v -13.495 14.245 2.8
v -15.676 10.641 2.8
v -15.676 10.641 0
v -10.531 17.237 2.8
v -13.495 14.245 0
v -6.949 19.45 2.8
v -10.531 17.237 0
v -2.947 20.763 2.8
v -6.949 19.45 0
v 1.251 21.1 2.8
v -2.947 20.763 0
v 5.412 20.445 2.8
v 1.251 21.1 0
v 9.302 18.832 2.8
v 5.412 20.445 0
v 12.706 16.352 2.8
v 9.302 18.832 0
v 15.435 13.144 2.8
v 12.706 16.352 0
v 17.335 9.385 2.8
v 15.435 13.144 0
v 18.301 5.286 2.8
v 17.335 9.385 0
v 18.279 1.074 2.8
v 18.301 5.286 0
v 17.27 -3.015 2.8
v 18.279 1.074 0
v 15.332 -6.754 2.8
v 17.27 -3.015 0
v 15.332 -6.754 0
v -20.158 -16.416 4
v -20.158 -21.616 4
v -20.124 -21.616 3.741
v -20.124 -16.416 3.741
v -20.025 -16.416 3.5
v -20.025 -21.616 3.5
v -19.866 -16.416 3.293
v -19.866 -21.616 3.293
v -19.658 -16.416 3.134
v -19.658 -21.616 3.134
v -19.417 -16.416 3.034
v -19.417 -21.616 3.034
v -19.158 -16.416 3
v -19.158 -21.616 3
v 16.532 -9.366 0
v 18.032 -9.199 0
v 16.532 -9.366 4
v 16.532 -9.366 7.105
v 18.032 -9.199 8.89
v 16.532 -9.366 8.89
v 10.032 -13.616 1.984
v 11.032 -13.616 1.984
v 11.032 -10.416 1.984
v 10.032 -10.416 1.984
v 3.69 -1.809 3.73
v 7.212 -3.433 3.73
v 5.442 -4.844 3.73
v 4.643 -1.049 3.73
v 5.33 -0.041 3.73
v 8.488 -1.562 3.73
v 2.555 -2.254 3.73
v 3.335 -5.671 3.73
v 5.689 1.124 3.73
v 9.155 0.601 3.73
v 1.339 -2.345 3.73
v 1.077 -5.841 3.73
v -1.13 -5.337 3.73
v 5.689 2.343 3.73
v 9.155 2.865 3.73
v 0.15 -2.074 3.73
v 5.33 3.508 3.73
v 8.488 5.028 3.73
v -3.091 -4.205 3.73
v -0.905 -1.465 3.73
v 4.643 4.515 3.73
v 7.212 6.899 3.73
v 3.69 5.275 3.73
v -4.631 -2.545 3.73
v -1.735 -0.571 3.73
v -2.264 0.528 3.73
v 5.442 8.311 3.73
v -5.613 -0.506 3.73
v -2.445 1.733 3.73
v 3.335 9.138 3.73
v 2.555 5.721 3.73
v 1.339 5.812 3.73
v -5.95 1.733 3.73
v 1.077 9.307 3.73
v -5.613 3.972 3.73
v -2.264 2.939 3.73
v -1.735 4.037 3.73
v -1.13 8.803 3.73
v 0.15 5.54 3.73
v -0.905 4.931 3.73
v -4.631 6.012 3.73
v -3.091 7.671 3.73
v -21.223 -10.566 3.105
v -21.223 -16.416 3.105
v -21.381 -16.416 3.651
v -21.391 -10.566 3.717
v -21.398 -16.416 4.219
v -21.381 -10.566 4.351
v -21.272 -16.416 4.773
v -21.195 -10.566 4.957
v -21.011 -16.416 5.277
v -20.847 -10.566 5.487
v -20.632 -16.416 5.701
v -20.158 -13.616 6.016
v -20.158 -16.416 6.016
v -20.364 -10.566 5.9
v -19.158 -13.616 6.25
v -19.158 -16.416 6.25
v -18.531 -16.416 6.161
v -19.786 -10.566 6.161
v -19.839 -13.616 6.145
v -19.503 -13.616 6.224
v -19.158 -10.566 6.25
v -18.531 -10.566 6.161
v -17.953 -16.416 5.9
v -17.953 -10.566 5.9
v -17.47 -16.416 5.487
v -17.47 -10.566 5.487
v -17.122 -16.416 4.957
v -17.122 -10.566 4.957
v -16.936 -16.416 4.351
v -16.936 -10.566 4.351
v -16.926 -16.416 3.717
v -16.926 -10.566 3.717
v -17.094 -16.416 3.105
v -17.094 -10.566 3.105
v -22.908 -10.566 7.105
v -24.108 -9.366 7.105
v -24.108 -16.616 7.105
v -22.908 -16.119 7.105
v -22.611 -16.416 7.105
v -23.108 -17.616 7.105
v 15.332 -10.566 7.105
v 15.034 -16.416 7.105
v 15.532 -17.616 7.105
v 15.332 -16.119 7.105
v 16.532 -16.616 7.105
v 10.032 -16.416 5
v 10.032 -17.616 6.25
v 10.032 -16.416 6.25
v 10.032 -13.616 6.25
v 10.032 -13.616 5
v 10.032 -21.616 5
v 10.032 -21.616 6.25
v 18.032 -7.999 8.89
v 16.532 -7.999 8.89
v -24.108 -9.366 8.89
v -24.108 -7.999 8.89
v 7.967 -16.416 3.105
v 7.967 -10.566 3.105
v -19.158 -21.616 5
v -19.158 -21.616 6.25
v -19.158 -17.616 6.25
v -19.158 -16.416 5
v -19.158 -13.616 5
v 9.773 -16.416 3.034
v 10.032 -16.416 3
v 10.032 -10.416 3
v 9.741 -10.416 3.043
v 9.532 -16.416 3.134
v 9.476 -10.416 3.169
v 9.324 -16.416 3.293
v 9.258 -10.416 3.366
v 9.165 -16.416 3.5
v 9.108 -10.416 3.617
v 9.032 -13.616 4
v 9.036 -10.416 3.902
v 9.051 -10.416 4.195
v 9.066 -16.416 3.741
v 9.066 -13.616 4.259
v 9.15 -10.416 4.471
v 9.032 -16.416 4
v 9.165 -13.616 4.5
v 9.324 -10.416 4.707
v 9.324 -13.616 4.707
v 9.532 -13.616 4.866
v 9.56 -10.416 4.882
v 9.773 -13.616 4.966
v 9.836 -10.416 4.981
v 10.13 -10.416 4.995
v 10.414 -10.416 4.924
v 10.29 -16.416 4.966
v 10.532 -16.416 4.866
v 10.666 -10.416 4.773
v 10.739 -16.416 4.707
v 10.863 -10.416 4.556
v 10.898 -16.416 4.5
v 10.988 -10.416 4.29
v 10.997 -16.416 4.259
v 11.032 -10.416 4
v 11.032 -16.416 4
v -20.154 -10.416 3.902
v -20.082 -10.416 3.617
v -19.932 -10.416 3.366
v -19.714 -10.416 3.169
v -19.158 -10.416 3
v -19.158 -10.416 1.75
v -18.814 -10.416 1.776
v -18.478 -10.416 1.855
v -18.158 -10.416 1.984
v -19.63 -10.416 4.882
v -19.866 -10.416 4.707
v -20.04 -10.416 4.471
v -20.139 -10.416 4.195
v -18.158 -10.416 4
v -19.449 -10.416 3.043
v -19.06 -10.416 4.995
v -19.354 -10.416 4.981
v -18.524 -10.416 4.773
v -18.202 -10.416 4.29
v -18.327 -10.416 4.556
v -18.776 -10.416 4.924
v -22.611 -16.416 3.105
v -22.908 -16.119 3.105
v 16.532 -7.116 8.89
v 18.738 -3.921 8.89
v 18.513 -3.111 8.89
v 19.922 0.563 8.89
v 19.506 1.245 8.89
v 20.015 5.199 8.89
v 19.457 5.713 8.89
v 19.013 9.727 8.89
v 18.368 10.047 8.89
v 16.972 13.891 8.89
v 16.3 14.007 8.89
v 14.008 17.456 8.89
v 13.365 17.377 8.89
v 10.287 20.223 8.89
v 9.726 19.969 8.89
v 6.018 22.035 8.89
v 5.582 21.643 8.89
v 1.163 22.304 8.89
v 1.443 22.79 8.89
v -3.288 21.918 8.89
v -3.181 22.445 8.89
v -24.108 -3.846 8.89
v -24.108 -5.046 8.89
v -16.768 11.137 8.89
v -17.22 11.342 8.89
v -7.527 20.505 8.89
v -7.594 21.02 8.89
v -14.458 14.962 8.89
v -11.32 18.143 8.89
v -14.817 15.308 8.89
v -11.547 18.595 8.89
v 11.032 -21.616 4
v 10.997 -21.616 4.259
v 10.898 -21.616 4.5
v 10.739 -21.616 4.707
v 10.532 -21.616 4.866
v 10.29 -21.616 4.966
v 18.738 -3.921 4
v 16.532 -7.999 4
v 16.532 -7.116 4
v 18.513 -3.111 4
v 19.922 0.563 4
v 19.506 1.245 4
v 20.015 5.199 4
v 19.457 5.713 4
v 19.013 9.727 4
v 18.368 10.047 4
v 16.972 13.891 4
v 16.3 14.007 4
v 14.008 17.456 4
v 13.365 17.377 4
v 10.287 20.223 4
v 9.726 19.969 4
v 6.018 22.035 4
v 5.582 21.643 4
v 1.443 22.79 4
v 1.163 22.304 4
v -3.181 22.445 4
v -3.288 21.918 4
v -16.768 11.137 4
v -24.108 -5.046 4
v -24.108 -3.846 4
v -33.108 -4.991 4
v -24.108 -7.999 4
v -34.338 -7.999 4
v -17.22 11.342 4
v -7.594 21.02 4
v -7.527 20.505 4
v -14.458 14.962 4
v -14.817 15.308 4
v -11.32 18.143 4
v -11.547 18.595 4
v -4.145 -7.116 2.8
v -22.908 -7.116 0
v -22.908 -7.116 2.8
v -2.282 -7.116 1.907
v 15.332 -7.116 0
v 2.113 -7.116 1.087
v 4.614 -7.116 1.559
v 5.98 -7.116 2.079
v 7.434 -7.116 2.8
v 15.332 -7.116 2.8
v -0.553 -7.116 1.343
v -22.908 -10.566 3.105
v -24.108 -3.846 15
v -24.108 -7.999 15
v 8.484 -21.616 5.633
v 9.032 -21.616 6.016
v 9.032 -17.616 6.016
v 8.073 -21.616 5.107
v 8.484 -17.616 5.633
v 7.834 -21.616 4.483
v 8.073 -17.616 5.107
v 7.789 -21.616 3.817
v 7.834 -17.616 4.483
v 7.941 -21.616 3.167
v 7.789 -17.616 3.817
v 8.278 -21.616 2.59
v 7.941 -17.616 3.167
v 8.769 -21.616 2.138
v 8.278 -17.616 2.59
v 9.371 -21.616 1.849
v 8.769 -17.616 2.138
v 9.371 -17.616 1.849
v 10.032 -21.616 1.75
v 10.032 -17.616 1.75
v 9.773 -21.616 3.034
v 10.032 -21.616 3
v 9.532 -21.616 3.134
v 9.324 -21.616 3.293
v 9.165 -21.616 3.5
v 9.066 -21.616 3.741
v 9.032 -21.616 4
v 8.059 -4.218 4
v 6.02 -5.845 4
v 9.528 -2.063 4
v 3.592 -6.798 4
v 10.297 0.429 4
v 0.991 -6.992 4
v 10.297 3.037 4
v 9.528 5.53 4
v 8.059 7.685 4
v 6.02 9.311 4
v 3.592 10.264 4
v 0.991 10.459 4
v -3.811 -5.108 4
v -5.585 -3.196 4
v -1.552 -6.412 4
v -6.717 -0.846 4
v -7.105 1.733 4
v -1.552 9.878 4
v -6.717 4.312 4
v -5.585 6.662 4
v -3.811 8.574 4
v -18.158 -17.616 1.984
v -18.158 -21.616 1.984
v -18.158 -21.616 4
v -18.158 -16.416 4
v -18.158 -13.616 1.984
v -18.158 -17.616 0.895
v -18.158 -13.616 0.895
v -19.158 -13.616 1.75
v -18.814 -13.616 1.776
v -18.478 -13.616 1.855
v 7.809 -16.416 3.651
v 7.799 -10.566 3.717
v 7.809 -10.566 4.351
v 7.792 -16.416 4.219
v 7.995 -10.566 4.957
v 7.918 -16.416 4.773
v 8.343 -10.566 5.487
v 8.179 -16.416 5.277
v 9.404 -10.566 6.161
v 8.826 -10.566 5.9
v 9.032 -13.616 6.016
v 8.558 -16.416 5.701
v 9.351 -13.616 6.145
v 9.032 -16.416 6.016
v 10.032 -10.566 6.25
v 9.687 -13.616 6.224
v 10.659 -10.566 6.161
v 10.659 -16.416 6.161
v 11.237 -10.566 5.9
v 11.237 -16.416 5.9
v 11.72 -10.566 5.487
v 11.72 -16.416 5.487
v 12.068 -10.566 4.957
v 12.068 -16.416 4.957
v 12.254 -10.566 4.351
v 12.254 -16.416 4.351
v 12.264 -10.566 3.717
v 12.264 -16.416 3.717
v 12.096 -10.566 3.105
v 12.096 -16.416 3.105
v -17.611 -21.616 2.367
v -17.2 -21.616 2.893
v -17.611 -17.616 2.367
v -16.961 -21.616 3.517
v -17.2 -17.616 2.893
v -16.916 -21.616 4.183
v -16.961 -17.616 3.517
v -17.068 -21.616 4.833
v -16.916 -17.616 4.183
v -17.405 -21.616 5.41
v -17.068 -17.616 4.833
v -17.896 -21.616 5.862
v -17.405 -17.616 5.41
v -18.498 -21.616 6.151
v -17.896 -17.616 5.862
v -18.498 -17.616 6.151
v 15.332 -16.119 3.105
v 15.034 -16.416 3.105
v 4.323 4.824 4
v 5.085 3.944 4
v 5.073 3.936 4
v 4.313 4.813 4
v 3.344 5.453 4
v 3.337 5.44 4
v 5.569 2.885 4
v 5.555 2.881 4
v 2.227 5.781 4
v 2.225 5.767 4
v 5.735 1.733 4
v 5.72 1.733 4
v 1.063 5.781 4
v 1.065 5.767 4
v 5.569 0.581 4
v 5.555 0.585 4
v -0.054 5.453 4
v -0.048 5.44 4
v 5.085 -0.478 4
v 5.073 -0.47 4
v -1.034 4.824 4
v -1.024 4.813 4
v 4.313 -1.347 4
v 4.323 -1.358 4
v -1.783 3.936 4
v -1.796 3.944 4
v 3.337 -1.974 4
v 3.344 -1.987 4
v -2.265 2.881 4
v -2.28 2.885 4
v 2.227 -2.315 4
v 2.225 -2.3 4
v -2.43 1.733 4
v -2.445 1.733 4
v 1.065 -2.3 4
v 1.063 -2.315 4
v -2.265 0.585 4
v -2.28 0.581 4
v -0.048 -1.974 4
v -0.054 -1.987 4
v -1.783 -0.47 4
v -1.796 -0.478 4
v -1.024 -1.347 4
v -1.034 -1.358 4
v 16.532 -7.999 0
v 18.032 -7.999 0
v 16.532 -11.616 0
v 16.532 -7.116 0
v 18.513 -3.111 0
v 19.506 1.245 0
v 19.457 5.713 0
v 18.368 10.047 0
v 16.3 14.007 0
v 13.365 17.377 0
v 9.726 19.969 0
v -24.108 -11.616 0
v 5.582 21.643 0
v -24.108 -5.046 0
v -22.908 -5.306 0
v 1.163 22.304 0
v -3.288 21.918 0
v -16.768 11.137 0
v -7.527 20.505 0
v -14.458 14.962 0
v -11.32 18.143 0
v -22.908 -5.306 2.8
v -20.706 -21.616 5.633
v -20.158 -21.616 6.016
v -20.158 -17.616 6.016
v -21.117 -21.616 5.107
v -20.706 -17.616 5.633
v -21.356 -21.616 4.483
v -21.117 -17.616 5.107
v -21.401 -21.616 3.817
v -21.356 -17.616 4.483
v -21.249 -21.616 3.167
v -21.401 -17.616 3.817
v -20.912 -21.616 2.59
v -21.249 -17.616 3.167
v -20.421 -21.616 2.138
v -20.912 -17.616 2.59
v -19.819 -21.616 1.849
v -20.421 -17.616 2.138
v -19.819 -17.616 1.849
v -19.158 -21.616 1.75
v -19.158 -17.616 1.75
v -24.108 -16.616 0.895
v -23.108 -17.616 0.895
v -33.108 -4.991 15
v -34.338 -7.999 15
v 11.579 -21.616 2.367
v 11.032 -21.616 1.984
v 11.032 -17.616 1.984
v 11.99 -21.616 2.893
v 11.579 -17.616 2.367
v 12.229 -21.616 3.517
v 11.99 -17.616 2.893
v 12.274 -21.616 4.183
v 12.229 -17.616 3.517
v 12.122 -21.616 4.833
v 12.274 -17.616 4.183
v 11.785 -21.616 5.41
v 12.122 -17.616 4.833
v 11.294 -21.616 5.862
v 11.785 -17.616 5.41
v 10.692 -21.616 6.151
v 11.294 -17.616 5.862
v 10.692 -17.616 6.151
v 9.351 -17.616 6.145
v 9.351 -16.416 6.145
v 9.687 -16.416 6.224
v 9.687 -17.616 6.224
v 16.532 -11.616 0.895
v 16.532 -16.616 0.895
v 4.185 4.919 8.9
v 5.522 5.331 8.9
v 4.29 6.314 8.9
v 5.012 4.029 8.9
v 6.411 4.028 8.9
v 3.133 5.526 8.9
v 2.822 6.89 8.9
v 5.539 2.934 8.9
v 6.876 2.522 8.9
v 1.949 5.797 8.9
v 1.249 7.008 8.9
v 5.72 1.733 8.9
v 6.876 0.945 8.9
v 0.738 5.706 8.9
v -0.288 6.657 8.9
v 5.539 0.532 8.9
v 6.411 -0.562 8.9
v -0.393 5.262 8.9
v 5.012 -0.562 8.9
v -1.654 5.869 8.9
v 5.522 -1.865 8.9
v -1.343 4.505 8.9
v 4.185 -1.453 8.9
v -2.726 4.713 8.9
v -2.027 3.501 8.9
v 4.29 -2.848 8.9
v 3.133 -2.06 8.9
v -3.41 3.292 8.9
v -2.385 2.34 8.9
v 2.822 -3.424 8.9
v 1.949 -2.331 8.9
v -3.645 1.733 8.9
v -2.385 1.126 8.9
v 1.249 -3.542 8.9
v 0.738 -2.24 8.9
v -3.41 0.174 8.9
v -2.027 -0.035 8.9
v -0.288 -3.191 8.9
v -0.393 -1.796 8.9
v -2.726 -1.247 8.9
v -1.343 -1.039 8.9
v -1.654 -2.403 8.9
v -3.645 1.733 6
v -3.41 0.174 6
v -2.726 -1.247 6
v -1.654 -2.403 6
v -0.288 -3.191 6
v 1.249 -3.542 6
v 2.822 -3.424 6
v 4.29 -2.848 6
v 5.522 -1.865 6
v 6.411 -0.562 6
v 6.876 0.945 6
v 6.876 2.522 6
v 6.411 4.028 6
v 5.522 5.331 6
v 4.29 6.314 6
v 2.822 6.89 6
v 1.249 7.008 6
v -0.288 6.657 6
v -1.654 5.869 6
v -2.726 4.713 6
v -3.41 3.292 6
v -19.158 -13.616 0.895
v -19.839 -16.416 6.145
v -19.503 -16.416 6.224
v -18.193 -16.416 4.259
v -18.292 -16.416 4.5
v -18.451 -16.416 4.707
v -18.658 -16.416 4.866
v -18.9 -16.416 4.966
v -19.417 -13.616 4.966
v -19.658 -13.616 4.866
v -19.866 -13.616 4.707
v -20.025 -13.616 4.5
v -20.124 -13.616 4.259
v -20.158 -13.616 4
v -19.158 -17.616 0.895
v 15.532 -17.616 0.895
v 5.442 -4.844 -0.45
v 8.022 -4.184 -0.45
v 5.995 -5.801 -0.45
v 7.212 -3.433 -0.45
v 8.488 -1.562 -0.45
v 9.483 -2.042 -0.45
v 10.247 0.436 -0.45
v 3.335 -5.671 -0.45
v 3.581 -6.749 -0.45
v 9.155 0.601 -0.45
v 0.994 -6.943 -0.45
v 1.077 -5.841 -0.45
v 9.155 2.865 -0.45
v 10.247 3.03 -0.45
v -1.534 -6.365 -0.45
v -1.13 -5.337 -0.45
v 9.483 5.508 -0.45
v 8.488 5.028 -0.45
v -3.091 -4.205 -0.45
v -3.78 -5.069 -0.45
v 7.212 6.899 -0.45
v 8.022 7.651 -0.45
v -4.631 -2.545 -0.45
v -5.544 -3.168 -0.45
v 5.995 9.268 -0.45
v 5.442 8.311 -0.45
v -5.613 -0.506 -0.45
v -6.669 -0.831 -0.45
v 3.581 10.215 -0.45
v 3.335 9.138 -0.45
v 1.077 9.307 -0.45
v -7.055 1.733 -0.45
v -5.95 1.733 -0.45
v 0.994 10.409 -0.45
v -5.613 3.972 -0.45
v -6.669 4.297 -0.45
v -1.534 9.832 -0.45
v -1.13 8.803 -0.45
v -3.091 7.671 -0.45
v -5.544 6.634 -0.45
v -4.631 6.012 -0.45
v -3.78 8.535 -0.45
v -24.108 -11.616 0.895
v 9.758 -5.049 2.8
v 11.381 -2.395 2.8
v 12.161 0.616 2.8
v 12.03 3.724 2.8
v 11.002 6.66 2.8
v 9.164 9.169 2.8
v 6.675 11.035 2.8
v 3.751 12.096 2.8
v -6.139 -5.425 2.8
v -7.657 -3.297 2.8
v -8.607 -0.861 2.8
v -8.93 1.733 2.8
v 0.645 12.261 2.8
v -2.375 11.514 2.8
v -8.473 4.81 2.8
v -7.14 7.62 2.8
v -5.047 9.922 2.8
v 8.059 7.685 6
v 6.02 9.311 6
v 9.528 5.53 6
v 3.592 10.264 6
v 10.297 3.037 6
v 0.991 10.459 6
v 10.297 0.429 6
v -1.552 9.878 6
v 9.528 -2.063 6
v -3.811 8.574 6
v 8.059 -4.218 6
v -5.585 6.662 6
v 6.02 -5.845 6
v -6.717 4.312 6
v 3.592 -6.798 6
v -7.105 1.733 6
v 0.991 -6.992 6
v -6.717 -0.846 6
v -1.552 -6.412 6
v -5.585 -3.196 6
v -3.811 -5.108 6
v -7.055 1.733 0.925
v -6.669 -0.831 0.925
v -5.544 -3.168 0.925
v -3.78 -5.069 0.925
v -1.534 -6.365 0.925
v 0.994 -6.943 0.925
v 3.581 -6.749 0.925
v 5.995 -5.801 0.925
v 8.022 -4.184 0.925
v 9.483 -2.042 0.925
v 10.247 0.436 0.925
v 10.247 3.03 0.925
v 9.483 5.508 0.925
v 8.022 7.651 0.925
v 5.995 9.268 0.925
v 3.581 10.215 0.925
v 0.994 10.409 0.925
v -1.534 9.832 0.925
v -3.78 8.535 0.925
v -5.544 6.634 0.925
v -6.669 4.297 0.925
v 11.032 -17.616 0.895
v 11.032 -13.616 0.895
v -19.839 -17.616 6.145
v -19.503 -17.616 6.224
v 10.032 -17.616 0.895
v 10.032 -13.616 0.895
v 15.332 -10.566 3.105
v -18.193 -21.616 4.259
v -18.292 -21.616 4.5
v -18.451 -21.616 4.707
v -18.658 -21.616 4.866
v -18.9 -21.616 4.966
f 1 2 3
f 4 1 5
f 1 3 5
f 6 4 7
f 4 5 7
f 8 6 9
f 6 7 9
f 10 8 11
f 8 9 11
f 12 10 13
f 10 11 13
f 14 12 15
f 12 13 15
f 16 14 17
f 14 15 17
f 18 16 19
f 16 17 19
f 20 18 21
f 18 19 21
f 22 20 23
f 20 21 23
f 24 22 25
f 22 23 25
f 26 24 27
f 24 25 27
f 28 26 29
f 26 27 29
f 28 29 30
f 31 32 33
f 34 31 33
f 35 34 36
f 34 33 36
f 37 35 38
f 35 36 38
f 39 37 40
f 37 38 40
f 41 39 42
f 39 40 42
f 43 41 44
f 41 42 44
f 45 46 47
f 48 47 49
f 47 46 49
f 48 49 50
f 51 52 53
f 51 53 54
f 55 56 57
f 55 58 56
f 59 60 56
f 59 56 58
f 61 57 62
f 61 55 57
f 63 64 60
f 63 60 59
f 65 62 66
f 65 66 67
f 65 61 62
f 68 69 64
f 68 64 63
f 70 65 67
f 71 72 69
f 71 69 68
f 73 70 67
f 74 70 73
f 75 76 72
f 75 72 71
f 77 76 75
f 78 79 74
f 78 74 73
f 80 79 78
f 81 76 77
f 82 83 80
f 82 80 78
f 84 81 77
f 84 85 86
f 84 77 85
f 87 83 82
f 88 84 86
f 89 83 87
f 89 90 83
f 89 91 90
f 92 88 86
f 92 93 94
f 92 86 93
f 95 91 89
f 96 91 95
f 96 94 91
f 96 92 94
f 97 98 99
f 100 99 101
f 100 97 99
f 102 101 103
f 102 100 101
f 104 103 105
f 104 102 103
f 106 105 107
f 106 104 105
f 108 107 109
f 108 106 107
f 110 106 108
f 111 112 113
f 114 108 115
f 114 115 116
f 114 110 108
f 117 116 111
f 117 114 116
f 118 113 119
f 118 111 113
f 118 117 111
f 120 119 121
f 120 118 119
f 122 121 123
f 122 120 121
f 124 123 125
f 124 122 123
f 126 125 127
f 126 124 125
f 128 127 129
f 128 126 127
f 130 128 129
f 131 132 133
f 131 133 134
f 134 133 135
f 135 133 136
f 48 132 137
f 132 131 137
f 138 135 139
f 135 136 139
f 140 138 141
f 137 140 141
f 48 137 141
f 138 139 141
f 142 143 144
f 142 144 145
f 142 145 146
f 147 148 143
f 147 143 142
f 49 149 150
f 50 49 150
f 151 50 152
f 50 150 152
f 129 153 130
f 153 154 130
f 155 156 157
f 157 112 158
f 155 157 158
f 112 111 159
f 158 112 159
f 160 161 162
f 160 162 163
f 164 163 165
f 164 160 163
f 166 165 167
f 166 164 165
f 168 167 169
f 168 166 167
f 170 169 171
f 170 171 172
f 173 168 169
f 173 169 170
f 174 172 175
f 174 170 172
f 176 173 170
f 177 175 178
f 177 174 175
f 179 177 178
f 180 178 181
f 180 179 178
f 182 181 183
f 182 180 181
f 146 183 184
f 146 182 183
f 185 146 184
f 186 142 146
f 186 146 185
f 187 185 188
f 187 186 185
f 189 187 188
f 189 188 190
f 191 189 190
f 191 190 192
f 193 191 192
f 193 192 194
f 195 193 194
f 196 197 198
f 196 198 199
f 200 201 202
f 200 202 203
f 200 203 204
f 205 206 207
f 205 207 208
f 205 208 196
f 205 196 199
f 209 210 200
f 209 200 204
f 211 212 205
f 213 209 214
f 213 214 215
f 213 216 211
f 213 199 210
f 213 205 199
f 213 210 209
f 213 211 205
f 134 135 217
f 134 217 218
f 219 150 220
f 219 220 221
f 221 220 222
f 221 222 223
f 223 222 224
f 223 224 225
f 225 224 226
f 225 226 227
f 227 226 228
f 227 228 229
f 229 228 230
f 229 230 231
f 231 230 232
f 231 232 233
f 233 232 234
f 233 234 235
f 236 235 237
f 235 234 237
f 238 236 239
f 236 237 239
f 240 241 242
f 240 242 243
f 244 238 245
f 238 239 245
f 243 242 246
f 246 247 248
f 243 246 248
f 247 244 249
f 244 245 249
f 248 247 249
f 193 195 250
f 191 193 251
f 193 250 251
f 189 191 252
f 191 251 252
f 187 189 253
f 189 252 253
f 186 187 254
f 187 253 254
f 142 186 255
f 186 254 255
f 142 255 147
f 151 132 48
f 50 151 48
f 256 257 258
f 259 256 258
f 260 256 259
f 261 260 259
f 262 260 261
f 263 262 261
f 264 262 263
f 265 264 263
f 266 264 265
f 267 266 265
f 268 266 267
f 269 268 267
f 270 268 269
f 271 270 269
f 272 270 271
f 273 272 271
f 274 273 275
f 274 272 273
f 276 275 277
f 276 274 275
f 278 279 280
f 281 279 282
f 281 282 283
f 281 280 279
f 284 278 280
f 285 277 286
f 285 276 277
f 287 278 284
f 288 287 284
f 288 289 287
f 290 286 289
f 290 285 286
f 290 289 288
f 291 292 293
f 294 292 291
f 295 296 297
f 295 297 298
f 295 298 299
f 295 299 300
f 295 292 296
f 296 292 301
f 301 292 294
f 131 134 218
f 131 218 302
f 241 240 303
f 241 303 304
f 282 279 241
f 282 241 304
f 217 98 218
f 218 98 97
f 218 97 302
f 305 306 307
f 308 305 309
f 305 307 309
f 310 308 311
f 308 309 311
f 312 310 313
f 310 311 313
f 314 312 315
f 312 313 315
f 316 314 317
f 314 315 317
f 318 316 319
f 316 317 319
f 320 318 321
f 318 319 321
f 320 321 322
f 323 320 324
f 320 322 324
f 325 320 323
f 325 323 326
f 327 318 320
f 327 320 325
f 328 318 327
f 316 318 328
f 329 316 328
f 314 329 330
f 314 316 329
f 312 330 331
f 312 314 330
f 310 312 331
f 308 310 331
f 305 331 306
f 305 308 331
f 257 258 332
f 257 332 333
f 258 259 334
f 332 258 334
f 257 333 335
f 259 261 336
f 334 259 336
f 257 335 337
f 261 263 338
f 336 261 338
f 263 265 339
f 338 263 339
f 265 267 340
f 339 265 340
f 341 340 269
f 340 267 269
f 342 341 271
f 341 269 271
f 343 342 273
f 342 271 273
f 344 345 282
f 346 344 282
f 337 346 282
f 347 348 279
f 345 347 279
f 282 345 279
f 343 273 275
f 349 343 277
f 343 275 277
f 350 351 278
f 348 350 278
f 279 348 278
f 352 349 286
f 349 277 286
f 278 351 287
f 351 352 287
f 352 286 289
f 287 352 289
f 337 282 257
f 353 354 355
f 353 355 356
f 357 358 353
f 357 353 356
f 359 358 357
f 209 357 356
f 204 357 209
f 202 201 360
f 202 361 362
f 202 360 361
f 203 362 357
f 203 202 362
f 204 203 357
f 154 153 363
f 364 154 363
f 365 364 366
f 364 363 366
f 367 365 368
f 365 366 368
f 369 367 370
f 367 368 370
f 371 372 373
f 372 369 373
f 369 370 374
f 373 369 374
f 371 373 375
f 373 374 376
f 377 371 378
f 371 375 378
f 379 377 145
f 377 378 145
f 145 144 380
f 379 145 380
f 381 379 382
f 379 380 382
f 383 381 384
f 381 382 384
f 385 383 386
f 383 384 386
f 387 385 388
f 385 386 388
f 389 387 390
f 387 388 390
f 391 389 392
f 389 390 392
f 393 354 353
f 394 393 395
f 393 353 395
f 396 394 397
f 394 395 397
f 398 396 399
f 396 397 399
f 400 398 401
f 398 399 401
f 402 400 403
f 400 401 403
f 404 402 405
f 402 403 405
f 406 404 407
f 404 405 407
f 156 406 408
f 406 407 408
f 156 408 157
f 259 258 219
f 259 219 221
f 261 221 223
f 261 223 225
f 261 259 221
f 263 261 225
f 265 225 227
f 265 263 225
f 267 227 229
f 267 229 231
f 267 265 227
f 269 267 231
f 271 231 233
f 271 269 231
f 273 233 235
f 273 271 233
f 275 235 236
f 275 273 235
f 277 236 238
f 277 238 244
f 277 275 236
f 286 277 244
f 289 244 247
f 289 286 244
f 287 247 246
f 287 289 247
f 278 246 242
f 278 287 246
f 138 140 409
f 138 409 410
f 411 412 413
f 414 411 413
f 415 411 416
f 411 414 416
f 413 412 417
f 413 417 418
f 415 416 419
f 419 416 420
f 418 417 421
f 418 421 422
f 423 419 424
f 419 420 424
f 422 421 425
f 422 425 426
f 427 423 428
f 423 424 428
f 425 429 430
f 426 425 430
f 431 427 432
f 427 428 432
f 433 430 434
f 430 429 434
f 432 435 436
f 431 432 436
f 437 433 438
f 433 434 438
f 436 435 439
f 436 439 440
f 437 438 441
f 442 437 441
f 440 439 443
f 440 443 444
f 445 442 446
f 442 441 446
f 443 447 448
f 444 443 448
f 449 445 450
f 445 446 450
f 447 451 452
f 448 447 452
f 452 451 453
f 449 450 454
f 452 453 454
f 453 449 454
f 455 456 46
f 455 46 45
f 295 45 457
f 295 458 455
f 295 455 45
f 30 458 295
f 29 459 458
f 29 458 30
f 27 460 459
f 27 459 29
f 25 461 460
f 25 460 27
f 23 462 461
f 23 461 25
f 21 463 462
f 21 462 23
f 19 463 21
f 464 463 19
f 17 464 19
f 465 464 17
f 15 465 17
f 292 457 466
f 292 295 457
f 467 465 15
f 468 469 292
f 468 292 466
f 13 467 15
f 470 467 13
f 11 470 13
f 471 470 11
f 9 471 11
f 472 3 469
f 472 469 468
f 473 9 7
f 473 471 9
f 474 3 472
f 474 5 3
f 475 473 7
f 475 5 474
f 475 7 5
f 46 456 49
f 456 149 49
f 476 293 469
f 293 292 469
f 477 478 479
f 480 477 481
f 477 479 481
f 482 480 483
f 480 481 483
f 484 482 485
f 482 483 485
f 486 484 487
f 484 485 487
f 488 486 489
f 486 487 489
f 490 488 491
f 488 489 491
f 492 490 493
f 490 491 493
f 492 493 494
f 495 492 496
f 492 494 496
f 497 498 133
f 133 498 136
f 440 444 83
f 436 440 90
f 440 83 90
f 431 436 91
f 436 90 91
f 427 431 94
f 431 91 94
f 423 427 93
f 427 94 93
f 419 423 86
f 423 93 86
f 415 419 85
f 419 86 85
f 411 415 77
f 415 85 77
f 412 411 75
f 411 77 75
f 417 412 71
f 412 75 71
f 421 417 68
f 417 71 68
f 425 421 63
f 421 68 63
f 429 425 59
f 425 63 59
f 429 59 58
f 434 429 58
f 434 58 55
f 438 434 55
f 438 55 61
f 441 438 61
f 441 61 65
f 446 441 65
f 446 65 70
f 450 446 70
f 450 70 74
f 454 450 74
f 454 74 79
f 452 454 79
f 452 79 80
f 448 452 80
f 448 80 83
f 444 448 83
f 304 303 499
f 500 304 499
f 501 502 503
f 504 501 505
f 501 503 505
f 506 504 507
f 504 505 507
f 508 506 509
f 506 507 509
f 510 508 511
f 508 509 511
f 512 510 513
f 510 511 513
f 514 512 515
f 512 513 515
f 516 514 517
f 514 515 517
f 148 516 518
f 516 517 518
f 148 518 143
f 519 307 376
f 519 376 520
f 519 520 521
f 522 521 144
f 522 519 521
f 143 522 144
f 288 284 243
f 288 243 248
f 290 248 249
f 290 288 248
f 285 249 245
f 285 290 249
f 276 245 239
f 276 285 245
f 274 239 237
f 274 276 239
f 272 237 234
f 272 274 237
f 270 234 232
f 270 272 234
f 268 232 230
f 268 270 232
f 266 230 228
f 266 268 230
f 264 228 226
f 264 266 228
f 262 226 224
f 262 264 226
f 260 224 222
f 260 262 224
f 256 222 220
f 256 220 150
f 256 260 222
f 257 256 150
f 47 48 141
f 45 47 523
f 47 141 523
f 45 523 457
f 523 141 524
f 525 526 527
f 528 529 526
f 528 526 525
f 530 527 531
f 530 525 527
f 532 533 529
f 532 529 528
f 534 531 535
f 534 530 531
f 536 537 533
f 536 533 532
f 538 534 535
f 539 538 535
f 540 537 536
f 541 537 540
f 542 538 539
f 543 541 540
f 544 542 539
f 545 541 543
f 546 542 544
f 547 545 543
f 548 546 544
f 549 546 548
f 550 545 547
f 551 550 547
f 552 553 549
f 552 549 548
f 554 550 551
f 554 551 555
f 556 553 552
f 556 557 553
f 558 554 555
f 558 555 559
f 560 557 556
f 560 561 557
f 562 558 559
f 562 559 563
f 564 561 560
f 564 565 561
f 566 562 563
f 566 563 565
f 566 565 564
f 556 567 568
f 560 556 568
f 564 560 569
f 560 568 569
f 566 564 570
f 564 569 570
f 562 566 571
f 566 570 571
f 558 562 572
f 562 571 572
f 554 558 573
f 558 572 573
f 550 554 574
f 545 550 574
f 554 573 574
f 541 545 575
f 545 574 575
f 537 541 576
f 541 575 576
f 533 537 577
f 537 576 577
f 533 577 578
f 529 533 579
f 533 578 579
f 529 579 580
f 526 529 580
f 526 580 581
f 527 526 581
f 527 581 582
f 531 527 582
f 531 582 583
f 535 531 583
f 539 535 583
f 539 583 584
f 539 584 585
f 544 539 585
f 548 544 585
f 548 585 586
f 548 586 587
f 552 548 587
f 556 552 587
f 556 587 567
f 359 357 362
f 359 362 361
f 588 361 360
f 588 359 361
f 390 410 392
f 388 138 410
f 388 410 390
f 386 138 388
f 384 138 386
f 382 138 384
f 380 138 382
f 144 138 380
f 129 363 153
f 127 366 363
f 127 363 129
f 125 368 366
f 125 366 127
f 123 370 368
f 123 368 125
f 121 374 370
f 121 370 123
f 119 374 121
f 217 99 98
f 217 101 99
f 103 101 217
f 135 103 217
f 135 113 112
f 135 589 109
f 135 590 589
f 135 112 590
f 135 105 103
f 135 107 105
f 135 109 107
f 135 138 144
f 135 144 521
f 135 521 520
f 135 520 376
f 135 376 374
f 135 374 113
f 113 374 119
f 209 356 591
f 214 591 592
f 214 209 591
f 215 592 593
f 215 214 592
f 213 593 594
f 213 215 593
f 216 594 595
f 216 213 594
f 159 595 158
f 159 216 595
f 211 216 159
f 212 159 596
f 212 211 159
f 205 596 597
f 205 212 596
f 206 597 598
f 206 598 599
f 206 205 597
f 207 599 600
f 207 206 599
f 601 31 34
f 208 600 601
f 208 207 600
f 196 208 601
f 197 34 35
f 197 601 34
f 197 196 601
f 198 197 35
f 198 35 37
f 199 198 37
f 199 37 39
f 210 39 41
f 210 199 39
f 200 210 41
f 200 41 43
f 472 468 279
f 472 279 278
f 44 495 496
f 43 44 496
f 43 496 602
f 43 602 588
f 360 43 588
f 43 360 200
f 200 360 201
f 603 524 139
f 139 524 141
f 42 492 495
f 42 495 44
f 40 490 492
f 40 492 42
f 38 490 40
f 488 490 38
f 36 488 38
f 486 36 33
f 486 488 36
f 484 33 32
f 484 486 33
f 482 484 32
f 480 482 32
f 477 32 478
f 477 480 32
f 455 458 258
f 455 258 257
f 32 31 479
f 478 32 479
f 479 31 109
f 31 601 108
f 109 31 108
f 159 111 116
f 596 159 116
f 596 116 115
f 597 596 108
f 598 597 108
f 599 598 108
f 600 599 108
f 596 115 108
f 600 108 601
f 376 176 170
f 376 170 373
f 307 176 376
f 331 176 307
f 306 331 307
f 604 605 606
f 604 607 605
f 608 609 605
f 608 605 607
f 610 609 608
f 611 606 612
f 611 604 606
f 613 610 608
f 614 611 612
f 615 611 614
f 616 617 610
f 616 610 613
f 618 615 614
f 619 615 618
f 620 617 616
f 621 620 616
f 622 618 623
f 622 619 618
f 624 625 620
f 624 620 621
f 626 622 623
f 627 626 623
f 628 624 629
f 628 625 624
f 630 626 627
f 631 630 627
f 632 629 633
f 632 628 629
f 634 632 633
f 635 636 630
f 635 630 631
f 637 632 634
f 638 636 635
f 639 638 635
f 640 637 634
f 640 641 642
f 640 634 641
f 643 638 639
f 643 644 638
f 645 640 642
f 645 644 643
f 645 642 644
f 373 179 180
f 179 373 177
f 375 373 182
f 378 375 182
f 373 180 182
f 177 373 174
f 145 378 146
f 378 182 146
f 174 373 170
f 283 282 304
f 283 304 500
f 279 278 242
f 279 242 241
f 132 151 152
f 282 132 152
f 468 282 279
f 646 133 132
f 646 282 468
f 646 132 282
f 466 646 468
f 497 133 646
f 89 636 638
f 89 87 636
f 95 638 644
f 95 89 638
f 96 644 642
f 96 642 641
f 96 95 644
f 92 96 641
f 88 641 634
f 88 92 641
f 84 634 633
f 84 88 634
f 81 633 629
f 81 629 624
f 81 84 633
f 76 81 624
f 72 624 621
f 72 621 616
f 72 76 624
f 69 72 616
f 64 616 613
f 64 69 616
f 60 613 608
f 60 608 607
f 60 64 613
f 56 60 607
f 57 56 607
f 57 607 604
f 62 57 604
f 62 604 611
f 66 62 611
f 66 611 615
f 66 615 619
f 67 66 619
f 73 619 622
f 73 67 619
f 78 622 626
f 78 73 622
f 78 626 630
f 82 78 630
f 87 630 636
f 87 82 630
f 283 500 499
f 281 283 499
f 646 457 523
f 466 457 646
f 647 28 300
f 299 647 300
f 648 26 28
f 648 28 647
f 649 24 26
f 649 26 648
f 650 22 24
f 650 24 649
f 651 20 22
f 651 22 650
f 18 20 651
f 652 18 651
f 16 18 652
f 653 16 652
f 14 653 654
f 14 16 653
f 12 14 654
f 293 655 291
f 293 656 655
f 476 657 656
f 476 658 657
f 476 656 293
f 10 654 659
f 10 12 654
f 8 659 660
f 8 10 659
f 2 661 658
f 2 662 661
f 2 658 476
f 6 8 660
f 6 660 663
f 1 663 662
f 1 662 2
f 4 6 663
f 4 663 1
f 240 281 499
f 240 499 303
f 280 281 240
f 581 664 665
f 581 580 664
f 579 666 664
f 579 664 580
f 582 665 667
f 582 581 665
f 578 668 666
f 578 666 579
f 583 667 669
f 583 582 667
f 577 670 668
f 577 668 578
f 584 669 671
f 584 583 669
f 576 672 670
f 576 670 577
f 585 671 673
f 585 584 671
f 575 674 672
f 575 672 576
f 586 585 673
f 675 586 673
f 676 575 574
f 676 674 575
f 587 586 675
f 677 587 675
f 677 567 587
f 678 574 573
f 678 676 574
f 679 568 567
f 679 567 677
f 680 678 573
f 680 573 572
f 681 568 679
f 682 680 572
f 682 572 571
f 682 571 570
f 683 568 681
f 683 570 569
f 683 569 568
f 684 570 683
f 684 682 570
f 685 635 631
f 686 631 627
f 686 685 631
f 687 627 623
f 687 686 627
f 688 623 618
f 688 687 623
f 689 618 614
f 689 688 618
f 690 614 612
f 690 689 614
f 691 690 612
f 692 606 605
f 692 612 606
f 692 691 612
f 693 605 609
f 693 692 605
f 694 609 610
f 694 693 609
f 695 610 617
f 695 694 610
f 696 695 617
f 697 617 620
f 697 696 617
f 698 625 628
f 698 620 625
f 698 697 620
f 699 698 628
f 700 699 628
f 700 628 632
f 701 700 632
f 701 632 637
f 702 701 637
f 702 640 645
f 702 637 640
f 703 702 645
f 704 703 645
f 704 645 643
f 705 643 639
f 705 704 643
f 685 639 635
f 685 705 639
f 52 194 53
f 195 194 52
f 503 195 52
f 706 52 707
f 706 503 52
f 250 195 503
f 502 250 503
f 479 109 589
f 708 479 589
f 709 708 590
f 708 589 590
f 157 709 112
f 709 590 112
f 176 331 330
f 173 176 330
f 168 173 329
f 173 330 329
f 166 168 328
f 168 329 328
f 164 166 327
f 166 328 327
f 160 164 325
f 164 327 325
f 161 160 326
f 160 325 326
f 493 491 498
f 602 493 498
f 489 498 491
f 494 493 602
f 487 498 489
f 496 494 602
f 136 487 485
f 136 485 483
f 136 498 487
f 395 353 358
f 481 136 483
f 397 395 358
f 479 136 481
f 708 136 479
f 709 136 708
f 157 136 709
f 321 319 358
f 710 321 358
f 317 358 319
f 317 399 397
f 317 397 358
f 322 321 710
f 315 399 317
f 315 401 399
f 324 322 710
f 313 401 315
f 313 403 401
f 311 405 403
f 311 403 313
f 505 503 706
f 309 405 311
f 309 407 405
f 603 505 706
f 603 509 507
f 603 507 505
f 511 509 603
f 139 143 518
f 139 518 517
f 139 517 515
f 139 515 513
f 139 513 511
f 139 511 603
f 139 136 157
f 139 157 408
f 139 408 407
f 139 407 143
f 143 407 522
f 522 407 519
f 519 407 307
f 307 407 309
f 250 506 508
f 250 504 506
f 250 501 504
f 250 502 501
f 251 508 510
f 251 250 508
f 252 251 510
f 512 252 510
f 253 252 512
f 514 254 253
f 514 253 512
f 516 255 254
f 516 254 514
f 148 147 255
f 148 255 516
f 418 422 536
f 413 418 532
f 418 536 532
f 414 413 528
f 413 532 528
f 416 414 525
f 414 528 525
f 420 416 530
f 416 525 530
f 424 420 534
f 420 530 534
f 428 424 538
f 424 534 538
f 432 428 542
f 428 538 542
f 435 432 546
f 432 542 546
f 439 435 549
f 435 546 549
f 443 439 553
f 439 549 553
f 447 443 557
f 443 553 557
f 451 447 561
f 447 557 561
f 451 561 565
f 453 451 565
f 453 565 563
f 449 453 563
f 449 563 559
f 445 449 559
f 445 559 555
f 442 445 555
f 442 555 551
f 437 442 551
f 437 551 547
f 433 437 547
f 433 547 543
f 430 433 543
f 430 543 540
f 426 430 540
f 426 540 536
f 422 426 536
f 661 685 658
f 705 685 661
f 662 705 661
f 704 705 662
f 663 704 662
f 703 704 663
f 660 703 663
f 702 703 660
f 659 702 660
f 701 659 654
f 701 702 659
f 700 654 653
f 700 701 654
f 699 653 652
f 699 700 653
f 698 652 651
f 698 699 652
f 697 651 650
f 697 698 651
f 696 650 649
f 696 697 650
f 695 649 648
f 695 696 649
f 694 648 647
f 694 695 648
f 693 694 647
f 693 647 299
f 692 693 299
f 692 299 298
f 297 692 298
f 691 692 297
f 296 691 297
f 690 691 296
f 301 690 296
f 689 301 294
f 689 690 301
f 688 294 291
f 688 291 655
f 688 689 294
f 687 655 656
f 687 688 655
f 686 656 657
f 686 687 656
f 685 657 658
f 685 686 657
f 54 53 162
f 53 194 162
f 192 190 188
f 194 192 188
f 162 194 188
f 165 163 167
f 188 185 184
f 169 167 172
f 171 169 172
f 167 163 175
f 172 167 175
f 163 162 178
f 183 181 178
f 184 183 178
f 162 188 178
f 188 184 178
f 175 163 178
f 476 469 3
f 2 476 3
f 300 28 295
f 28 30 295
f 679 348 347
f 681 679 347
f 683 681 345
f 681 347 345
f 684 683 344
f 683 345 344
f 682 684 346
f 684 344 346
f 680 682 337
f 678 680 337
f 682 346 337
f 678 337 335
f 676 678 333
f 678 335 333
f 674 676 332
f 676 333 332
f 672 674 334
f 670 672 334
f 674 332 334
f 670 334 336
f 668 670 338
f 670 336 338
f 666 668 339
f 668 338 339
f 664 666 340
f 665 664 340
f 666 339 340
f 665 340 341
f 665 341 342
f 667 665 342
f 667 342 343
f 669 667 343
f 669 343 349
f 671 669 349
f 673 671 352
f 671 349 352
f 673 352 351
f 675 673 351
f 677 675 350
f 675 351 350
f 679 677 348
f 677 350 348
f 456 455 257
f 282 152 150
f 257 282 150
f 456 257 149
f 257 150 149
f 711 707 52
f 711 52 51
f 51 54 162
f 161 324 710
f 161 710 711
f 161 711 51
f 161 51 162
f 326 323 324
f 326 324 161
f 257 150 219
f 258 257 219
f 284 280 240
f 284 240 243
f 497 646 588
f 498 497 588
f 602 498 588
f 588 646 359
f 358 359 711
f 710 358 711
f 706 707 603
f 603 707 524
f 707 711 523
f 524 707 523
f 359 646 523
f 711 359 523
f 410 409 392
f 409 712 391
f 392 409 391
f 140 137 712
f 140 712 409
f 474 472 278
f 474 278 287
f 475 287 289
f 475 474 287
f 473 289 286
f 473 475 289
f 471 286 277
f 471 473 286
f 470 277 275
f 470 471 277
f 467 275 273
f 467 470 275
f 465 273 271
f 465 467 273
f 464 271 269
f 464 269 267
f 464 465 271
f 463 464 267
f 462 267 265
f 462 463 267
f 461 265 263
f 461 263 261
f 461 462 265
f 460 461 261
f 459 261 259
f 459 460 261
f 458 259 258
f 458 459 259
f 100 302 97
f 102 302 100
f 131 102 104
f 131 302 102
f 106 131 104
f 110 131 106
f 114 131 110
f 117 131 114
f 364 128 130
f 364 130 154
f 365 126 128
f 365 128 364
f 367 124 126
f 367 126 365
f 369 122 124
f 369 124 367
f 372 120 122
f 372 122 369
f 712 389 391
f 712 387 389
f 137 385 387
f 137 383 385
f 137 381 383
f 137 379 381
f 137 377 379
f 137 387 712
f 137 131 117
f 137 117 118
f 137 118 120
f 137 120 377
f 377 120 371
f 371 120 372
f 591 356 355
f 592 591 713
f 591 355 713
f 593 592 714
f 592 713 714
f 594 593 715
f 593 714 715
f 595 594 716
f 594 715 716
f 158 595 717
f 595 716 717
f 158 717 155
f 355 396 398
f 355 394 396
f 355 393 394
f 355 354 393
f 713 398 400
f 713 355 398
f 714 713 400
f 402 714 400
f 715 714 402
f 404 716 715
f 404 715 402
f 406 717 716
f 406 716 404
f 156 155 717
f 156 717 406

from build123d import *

# Parameters (mm, degrees)
BOSS_EXTRUDE1_DEPTH  = 4
SHELL1_T             = -1.2
SKETCH3_R            = 10.575
BOSS_EXTRUDE2_DEPTH  = 2.75
SKETCH4_R            = 8.7
SKETCH4_R_2          = 7.595
BOSS_EXTRUDE3_DEPTH  = 0.5
CHAMFER1_SIZE        = 2.75
CUT_EXTRUDE2_START   = -3.68
SKETCH5_R            = 7.595
CUT_EXTRUDE2_DEPTH   = 3.68
SKETCH6_R            = 4.09
CUT_EXTRUDE3_DEPTH   = 3.68
SKETCH7_W            = 40.64
SKETCH7_H            = 4.5
BOSS_EXTRUDE5_DEPTH  = 6
SKETCH18_W           = 40.64
SKETCH18_H           = 4.5
CUT_EXTRUDE10_DEPTH  = 2
BOSS_EXTRUDE16_DEPTH = 4.89
SKETCH20_W           = 40.64
SKETCH20_H           = 1.367101803
BOSS_EXTRUDE17_DEPTH = 4.89
BOSS_EXTRUDE18_DEPTH = 4.89
BOSS_EXTRUDE19_DEPTH = 4
BOSS_EXTRUDE24_DEPTH = 11
SKETCH31_W           = 40.64
SKETCH31_H           = 6.21
BOSS_EXTRUDE32_DEPTH = 6
CHAMFER2_SIZE        = 1
CHAMFER3_SIZE        = 1
SKETCH32_R           = 2.25
BOSS_EXTRUDE33_DEPTH = 4
SKETCH33_R           = 2.25
BOSS_EXTRUDE34_DEPTH = 4
SKETCH34_R           = 1
CUT_EXTRUDE14_DEPTH  = 8
CUT_EXTRUDE16_DEPTH  = 8
SKETCH37_R           = 1
CUT_EXTRUDE17_DEPTH  = 8
CUT_EXTRUDE19_DEPTH  = 8
SKETCH42_R           = 5.29
BOSS_EXTRUDE36_DEPTH = 4.9
SKETCH47_R           = 4.075
CUT_EXTRUDE21_DEPTH  = 21.9
SKETCH55_W           = 40.64
SKETCH55_H           = 3.105
BOSS_EXTRUDE47_DEPTH = 2.25
SKETCH59_W           = 1
SKETCH59_H           = 4
CUT_EXTRUDE29_DEPTH  = 1.08944
CUT_EXTRUDE35_DEPTH  = 4
BOSS_EXTRUDE54_START = 6
SKETCH70_R           = 2.25
BOSS_EXTRUDE54_DEPTH = 6
SKETCH66_R           = 8.75
BOSS_EXTRUDE66_DEPTH = 2
SKETCH71_R           = 2.25
BOSS_EXTRUDE71_DEPTH = 6
CUT_EXTRUDE39_DEPTH  = 8
CUT_EXTRUDE40_START  = -8
CUT_EXTRUDE40_DEPTH  = 8
SKETCH73_W           = 1
SKETCH73_H           = 4
CUT_EXTRUDE41_DEPTH  = 1.089436
CUT_EXTRUDE42_DEPTH  = 6
CUT_EXTRUDE43_START  = -6
CUT_EXTRUDE43_DEPTH  = 6
SKETCH79_R           = 4.075
CUT_EXTRUDE47_DEPTH  = 7


with BuildPart() as part:
    # Sketch1 → Boss-Extrude1 (new body)
    with BuildSketch(Plane.XY):
        with BuildLine():
            Line((-24.108496543, -7.116270468), (-24.108496543, -5.046270468))
            Line((-24.108496543, -5.046270468), (-16.768496543, 11.136920555))
            ThreePointArc((-16.768496543, 11.136920555), (9.72561941, 19.969325243), (16.531503457, -7.116270468))
            Line((16.531503457, -7.116270468), (16.531503457, -11.616270468))
            Line((16.531503457, -11.616270468), (-24.108496543, -11.616270468))
            Line((-24.108496543, -11.616270468), (-24.108496543, -7.116270468))
        make_face()
    extrude(amount=BOSS_EXTRUDE1_DEPTH)

    # Shell1
    shell1_openings = [part.faces().sort_by_distance(p)[0] for p in [
        (-1.110099133, 3.328032684, 0),
    ]]
    offset(amount=SHELL1_T, openings=shell1_openings, kind=Kind.INTERSECTION)

    # Sketch3 → Boss-Extrude2 (add)
    with BuildSketch(Plane(origin=(0, 0, 2.8), x_dir=(-1, 0, 0), z_dir=(0, 0, -1))):
        with Locations((-1.644644565, 1.733101785)):
            Circle(SKETCH3_R)
    extrude(amount=BOSS_EXTRUDE2_DEPTH)

    # Sketch4 → Boss-Extrude3 (add)
    with BuildSketch(Plane(origin=(0, 0, 0.05), x_dir=(-1, 0, 0), z_dir=(0, 0, -1))):
        with Locations((-1.644644565, 1.733101785)):
            Circle(SKETCH4_R)
        with Locations((-1.644644565, 1.733101785)):
            Circle(SKETCH4_R_2, mode=Mode.SUBTRACT)
    extrude(amount=BOSS_EXTRUDE3_DEPTH)

    # Chamfer1
    # the kernel refuses this chamfer: 2.75 mm, written as the material it takes off along each edge
    with BuildSketch(Plane(origin=(1.644644565, 1.733101785, 0.05), x_dir=(-1, 0, 0), z_dir=(0, -1, 0))) as chamfer1_piece_1_section:
        Polygon((10.575, -CHAMFER1_SIZE), (10.575 - CHAMFER1_SIZE, 0), (10.575, 0), align=None)
    chamfer1_piece_1 = revolve(axis=Axis((1.644644565, 1.733101785, 0.05), (0, 0, -1)), mode=Mode.PRIVATE)
    chamfer1_piece_1 = split(chamfer1_piece_1, bisect_by=Plane(origin=(11.325301981, 1.733101785, 2.8), z_dir=(0, 0, -1)), keep=Keep.TOP, mode=Mode.PRIVATE)
    chamfer1_piece_1 = chamfer1_piece_1 - Plane(origin=(1.644644565, 1.733101785, 1.819342584), x_dir=(-1, 0, 0), z_dir=(0, 0, 1)) * Cylinder(8.7, 43, mode=Mode.PRIVATE)
    add(chamfer1_piece_1, mode=Mode.SUBTRACT)

    # Sketch5 → Cut-Extrude2 (cut)
    with BuildSketch(Plane(origin=(0, 0, 0.05), x_dir=(-1, 0, 0), z_dir=(0, 0, -1)).offset(CUT_EXTRUDE2_START)):
        with Locations((-1.644644565, 1.733101785)):
            Circle(SKETCH5_R)
    extrude(amount=CUT_EXTRUDE2_DEPTH, mode=Mode.SUBTRACT)

    # Sketch6 → Cut-Extrude3 (cut)
    with BuildSketch(Plane(origin=(0, 0, 3.73), x_dir=(-1, 0, 0), z_dir=(0, 0, -1))):
        with Locations((-1.644644565, 1.733101785)):
            Circle(SKETCH6_R)
    extrude(amount=-CUT_EXTRUDE3_DEPTH, mode=Mode.SUBTRACT)

    # Sketch7 → Boss-Extrude5 (add)
    with BuildSketch(Plane.XY):
        with Locations((-3.788496543, -9.366270468)):
            Rectangle(SKETCH7_W, SKETCH7_H)
    extrude(amount=BOSS_EXTRUDE5_DEPTH)

    # Sketch18 → Cut-Extrude10 (cut)
    with BuildSketch(Plane.XY.offset(6)):
        with Locations((-3.788496543, -9.366270468)):
            Rectangle(SKETCH18_W, SKETCH18_H)
    extrude(amount=-CUT_EXTRUDE10_DEPTH, mode=Mode.SUBTRACT)

    # Sketch20 → Boss-Extrude17 (add)
    with BuildSketch(Plane.XY.offset(4)):
        with Locations((-3.788496543, -8.682719567)):
            Rectangle(SKETCH20_W, SKETCH20_H)
    extrude(amount=BOSS_EXTRUDE17_DEPTH)

    # Sketch21 → Boss-Extrude18 (add)
    with BuildSketch(Plane.XY.offset(4)):
        Polygon((16.531503457, -7.999168665), (18.031503457, -7.999168665), (18.031503457, -9.199168665), (16.531503457, -9.366270468), align=None)
    extrude(amount=BOSS_EXTRUDE18_DEPTH)

    # Sketch22 → Boss-Extrude19 (add)
    with BuildSketch(Plane(origin=(0, 0, 4), x_dir=(-1, 0, 0), z_dir=(0, 0, -1))):
        Polygon((-16.531503457, -7.999168665), (-18.031503457, -7.999168665), (-18.031503457, -9.199168665), (-16.531503457, -9.366270468), align=None)
    extrude(amount=BOSS_EXTRUDE19_DEPTH)

    # Sketch31 → Boss-Extrude32 (add)
    with BuildSketch(Plane.XZ.offset(11.616270468)):
        with Locations((-3.788496543, 4)):
            Rectangle(SKETCH31_W, SKETCH31_H)
    extrude(amount=BOSS_EXTRUDE32_DEPTH)

    # Chamfer2
    chamfer2_edges = [part.edges().sort_by_distance(p)[0] for p in [
        (-24.108496543, -17.616270468, 4),
    ]]
    chamfer(chamfer2_edges, length=CHAMFER2_SIZE)

    # Chamfer3
    chamfer3_edges = [part.edges().sort_by_distance(p)[0] for p in [
        (16.531503457, -17.616270468, 4),
    ]]
    chamfer(chamfer3_edges, length=CHAMFER3_SIZE)

    # Sketch32 → Boss-Extrude33 (add)
    with BuildSketch(Plane.XZ.offset(17.616270468)):
        with Locations(Location((-19.158496543, 4, 0), (0, 0, 90))):
            Circle(SKETCH32_R)
    extrude(amount=BOSS_EXTRUDE33_DEPTH)

    # Sketch33 → Boss-Extrude34 (add)
    with BuildSketch(Plane.XZ.offset(17.616270468)):
        with Locations(Location((10.031503457, 4, 0), (0, 0, 90))):
            Circle(SKETCH33_R)
    extrude(amount=BOSS_EXTRUDE34_DEPTH)

    # Sketch34 → Cut-Extrude14 (cut)
    with BuildSketch(Plane.XZ.offset(21.616270468)):
        with Locations(Location((-19.158496543, 4, 0), (0, 0, 270))):
            Circle(SKETCH34_R)
    extrude(amount=-CUT_EXTRUDE14_DEPTH, mode=Mode.SUBTRACT)

    # Sketch36 → Cut-Extrude16 (cut)
    with BuildSketch(Plane(origin=(0, -21.616270468, 0), x_dir=(-1, 0, 0), z_dir=(0, -1, 0))):
        with BuildLine():
            Line((18.158496543, -4), (18.158496543, -1.984435563))
            ThreePointArc((18.158496543, -1.984435563), (18.644940306, -1.80939278), (19.158496543, -1.75))
            Line((19.158496543, -1.75), (19.158496543, -3))
            ThreePointArc((19.158496543, -3), (18.451389761, -3.292893219), (18.158496543, -4))
        make_face()
    extrude(amount=-CUT_EXTRUDE16_DEPTH, mode=Mode.SUBTRACT)

    # Sketch37 → Cut-Extrude17 (cut)
    with BuildSketch(Plane.XZ.offset(21.616270468)):
        with Locations(Location((10.031503457, 4, 0), (0, 0, 270))):
            Circle(SKETCH37_R)
    extrude(amount=-CUT_EXTRUDE17_DEPTH, mode=Mode.SUBTRACT)

    # Sketch39 → Cut-Extrude19 (cut)
    with BuildSketch(Plane(origin=(0, -21.616270468, 0), x_dir=(-1, 0, 0), z_dir=(0, -1, 0))):
        with BuildLine():
            Line((-11.031503457, -4), (-11.031503457, -1.984435563))
            ThreePointArc((-11.031503457, -1.984435563), (-10.545059694, -1.80939278), (-10.031503457, -1.75))
            Line((-10.031503457, -1.75), (-10.031503457, -3))
            ThreePointArc((-10.031503457, -3), (-10.738610239, -3.292893219), (-11.031503457, -4))
        make_face()
    extrude(amount=-CUT_EXTRUDE19_DEPTH, mode=Mode.SUBTRACT)

    # Sketch42 → Boss-Extrude36 (add)
    with BuildSketch(Plane.XY.offset(4)):
        with Locations(Location((1.644644565, 1.733101785, 0), (0, 0, 180))):
            Circle(SKETCH42_R)
    extrude(amount=BOSS_EXTRUDE36_DEPTH)

    # Sketch47 → Cut-Extrude21 (cut)
    with BuildSketch(Plane.XY.offset(8.9)):
        with Locations((1.644644565, 1.733101785)):
            Circle(SKETCH47_R)
    extrude(amount=-CUT_EXTRUDE21_DEPTH, mode=Mode.SUBTRACT)

    # Sketch55 → Boss-Extrude47 (add)
    with BuildSketch(Plane(origin=(0, -11.616270468, 0), x_dir=(1, 0, 0), z_dir=(0, 1, 0))):
        with Locations((-3.788496543, -5.5525)):
            Rectangle(SKETCH55_W, SKETCH55_H)
    extrude(amount=BOSS_EXTRUDE47_DEPTH)

    # Sketch59 → Cut-Extrude29 (cut)
    with BuildSketch(Plane(origin=(0, 0, 0.895), x_dir=(-1, 0, 0), z_dir=(0, 0, -1))):
        with Locations((18.658496543, -15.616270468)):
            Rectangle(SKETCH59_W, SKETCH59_H)
    extrude(amount=-CUT_EXTRUDE29_DEPTH, mode=Mode.SUBTRACT)

    # Sketch68 → Cut-Extrude35 (cut)
    with BuildSketch(Plane.XY.offset(7.105)):
        Polygon((-22.908496543, -10.566270468), (15.331503457, -10.566270468), (15.331503457, -16.119214193), (15.034447183, -16.416270468), (-22.611440268, -16.416270468), (-22.908496543, -16.119214193), align=None)
    extrude(amount=-CUT_EXTRUDE35_DEPTH, mode=Mode.SUBTRACT)

    # Sketch70 → Boss-Extrude54 (add)
    with BuildSketch(Plane(origin=(0, -16.416270468, 0), x_dir=(1, 0, 0), z_dir=(0, 1, 0)).offset(BOSS_EXTRUDE54_START)):
        with Locations((-19.158496543, -4)):
            Circle(SKETCH70_R)
    extrude(amount=-BOSS_EXTRUDE54_DEPTH)

    # Sketch66 → Boss-Extrude66 (add)
    with BuildSketch(Plane.XY.offset(4)):
        with Locations(Location((1.644644565, 1.733101785, 0), (0, 0, 180))):
            Circle(SKETCH66_R)
    extrude(amount=BOSS_EXTRUDE66_DEPTH)

    # Sketch71 → Boss-Extrude71 (add)
    with BuildSketch(Plane(origin=(0, -16.416270468, 0), x_dir=(1, 0, 0), z_dir=(0, 1, 0))):
        with Locations((10.031503457, -4)):
            Circle(SKETCH71_R)
    extrude(amount=BOSS_EXTRUDE71_DEPTH)

    # Sketch38 → Cut-Extrude39 (cut)
    with BuildSketch(Plane(origin=(0, -21.616270468, 0), x_dir=(-1, 0, 0), z_dir=(0, -1, 0))):
        with BuildLine():
            Line((-9.031503457, -4), (-9.031503457, -6.015564437))
            ThreePointArc((-9.031503457, -6.015564437), (-9.517947221, -6.19060722), (-10.031503457, -6.25))
            Line((-10.031503457, -6.25), (-10.031503457, -5))
            ThreePointArc((-10.031503457, -5), (-9.324396676, -4.707106781), (-9.031503457, -4))
        make_face()
    extrude(amount=-CUT_EXTRUDE39_DEPTH, mode=Mode.SUBTRACT)

    # Sketch69 → Cut-Extrude40 (cut)
    with BuildSketch(Plane.XZ.offset(21.616270468).offset(CUT_EXTRUDE40_START)):
        with BuildLine():
            Line((-20.158496543, 4), (-20.158496543, 6.015564437))
            ThreePointArc((-20.158496543, 6.015564437), (-19.672052779, 6.19060722), (-19.158496543, 6.25))
            Line((-19.158496543, 6.25), (-19.158496543, 5))
            ThreePointArc((-19.158496543, 5), (-19.865603324, 4.707106781), (-20.158496543, 4))
        make_face()
    extrude(amount=CUT_EXTRUDE40_DEPTH, mode=Mode.SUBTRACT)

    # Sketch73 → Cut-Extrude41 (cut)
    with BuildSketch(Plane(origin=(0, 0, 0.895), x_dir=(-1, 0, 0), z_dir=(0, 0, -1))):
        with Locations((-10.531503457, -15.616270468)):
            Rectangle(SKETCH73_W, SKETCH73_H)
    extrude(amount=-CUT_EXTRUDE41_DEPTH, mode=Mode.SUBTRACT)

    # Sketch74 → Cut-Extrude42 (cut)
    with BuildSketch(Plane.XZ.offset(16.416270468)):
        with BuildLine():
            Line((11.031503457, 1.984435563), (10.031503457, 1.984435563))
            Line((10.031503457, 1.984435563), (10.031503457, 3))
            ThreePointArc((10.031503457, 3), (9.324396676, 4.707106781), (11.031503457, 4))
            Line((11.031503457, 4), (11.031503457, 1.984435563))
        make_face()
    extrude(amount=-CUT_EXTRUDE42_DEPTH, mode=Mode.SUBTRACT)

    # Sketch75 → Cut-Extrude43 (cut)
    with BuildSketch(Plane.XZ.offset(16.416270468).offset(CUT_EXTRUDE43_START)):
        with BuildLine():
            Line((-18.158496543, 1.984435563), (-18.158496543, 4))
            ThreePointArc((-18.158496543, 4), (-19.865603324, 4.707106781), (-19.158496543, 3))
            Line((-19.158496543, 3), (-19.158496543, 1.75))
            ThreePointArc((-19.158496543, 1.75), (-18.644940306, 1.80939278), (-18.158496543, 1.984435563))
        make_face()
    extrude(amount=CUT_EXTRUDE43_DEPTH, mode=Mode.SUBTRACT)

    # Sketch79 → Cut-Extrude47 (cut)
    with BuildSketch(Plane.XY.offset(6)):
        with Locations((1.644644565, 1.733101785)):
            Circle(SKETCH79_R)
    extrude(amount=-CUT_EXTRUDE47_DEPTH, mode=Mode.SUBTRACT)


with BuildPart() as body_2:
    # Sketch19 → Boss-Extrude16 (new body)
    with BuildSketch(Plane.XY.offset(4)):
        with BuildLine():
            Line((-24.108496543, -5.046270468), (-24.108496543, -3.846270468))
            Line((-24.108496543, -3.846270468), (-17.219904126, 11.341659636))
            ThreePointArc((-17.219904126, 11.341659636), (10.286675812, 20.223038003), (16.531503457, -7.999168665))
            Line((16.531503457, -7.999168665), (16.531503457, -7.116270468))
            ThreePointArc((16.531503457, -7.116270468), (9.72561941, 19.969325243), (-16.768496543, 11.136920555))
            Line((-16.768496543, 11.136920555), (-24.108496543, -5.046270468))
        make_face()
    extrude(amount=BOSS_EXTRUDE16_DEPTH)

    # Sketch23 → Boss-Extrude24 (add)
    with BuildSketch(Plane.XY.offset(4)):
        Polygon((-24.108496543, -3.846270468), (-24.108496543, -7.999168665), (-34.338496543, -7.999168665), (-33.108496543, -4.990913357), align=None)
    extrude(amount=BOSS_EXTRUDE24_DEPTH)


solid = Compound([part.part, body_2.part])
